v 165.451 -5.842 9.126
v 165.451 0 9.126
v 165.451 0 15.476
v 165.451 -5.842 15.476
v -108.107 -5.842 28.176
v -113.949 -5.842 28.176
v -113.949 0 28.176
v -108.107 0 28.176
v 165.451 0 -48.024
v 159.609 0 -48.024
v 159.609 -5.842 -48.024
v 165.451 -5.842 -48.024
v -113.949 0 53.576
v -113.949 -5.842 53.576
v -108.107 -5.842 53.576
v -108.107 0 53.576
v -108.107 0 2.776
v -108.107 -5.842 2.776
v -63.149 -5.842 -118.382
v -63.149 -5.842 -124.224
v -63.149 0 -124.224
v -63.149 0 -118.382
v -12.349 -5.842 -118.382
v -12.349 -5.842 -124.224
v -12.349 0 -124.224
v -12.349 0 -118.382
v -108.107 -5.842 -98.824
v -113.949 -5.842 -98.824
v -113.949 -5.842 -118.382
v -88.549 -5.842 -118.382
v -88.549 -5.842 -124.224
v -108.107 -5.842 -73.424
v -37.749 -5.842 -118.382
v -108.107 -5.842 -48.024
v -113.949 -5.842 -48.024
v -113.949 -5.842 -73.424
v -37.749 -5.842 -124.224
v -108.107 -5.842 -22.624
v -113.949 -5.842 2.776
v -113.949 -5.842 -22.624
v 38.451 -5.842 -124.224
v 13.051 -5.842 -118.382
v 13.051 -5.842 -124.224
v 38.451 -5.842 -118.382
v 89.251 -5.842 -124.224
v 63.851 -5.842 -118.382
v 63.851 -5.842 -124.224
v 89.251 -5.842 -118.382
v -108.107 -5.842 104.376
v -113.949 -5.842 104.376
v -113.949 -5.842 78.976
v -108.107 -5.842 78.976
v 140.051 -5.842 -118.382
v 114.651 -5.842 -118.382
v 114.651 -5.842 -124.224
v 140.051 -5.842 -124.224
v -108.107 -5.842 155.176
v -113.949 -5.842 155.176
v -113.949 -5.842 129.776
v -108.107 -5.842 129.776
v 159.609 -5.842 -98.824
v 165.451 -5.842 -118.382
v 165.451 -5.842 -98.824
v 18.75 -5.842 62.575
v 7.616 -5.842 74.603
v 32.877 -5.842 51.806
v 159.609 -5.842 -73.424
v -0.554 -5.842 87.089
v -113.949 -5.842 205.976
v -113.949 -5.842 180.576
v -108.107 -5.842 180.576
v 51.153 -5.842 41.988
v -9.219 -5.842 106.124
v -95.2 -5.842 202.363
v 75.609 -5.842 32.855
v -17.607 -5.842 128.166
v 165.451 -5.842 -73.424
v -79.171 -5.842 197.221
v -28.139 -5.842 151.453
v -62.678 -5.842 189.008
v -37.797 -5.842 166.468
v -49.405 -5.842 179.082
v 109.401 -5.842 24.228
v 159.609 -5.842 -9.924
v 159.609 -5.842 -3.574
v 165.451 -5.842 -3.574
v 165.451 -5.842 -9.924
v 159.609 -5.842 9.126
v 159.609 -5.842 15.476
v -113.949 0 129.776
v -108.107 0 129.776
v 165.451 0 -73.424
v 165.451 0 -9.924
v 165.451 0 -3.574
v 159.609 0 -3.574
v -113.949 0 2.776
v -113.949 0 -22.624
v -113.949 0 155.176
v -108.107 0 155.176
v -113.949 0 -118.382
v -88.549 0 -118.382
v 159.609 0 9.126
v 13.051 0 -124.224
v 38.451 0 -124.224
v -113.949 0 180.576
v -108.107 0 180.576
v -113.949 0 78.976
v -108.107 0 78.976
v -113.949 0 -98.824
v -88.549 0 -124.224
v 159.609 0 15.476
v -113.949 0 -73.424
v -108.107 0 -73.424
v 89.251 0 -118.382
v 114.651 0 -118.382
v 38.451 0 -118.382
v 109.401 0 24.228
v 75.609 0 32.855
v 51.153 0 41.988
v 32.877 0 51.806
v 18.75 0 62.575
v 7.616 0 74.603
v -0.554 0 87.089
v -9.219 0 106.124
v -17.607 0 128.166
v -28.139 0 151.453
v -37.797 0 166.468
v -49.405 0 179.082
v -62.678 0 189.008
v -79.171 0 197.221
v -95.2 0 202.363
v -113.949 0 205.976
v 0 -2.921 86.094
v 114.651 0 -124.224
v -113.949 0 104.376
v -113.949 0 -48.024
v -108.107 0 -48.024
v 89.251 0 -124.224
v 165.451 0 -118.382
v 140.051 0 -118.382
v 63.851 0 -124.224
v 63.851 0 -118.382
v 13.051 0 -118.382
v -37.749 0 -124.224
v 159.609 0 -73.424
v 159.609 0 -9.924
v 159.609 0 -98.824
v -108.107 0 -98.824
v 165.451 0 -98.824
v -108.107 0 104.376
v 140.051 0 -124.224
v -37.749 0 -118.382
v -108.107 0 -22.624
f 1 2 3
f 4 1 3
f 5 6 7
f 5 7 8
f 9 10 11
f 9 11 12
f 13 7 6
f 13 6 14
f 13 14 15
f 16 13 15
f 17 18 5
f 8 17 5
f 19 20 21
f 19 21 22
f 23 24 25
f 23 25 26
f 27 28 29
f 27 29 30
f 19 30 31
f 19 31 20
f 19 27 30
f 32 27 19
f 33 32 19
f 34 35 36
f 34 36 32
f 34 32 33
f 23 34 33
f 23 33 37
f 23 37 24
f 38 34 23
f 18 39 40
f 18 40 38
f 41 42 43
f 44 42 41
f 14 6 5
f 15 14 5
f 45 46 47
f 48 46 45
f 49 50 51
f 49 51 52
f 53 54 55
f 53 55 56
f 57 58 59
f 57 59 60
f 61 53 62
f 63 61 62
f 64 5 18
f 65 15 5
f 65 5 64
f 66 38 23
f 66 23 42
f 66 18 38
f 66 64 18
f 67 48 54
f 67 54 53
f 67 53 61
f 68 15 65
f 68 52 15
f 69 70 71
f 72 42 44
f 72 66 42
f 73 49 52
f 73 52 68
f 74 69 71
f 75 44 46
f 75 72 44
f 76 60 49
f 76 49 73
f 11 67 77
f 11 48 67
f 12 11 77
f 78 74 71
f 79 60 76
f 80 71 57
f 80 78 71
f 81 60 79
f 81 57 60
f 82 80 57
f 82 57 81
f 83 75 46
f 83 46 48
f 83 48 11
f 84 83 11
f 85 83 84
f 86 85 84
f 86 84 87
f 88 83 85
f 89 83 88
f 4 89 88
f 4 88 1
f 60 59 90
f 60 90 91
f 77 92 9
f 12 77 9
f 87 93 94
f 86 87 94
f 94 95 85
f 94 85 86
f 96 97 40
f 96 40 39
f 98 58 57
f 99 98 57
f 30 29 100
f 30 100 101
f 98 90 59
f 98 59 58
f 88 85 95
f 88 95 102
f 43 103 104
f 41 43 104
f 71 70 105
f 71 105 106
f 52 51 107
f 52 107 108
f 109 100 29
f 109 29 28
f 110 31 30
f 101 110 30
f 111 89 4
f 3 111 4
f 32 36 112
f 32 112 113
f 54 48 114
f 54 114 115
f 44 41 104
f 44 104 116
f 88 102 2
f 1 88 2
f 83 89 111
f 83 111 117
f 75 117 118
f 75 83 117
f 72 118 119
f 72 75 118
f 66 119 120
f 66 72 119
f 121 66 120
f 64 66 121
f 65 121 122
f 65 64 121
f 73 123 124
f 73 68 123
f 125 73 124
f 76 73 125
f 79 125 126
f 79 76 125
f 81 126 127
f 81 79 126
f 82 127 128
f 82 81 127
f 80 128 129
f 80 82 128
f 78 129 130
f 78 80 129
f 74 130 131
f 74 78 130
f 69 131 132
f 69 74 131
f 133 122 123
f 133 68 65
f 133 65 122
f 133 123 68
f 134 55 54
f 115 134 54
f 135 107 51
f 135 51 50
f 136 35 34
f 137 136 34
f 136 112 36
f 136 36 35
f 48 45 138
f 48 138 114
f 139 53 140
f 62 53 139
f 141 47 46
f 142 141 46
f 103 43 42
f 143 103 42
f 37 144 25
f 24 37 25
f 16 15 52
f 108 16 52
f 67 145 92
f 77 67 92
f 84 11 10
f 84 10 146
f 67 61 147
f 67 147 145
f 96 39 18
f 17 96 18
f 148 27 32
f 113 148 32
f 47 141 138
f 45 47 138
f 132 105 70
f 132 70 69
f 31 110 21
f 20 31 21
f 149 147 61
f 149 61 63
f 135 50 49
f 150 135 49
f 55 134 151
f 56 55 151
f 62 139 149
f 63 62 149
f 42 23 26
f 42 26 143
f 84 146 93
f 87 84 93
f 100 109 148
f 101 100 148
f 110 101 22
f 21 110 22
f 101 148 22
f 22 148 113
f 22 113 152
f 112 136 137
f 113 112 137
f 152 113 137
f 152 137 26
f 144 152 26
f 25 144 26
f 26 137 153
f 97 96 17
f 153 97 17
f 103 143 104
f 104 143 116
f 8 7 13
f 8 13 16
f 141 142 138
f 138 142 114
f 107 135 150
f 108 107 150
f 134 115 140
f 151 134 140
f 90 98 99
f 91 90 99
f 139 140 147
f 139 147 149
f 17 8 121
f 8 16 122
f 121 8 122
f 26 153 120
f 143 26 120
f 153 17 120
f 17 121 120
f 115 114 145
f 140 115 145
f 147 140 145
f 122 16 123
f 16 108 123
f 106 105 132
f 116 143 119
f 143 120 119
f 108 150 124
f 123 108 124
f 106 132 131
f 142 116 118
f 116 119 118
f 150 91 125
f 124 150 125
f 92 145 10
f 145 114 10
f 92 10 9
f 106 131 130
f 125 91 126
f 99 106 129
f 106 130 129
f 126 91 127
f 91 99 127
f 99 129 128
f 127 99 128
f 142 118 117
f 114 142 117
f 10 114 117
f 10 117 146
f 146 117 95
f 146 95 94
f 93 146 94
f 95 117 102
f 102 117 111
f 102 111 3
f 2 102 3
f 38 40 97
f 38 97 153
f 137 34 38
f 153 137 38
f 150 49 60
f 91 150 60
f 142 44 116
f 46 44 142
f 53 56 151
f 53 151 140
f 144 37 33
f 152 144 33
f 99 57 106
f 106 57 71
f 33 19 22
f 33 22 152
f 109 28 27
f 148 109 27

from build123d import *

# Parameters (mm, degrees)
F0_W     = 279.4
F0_H     = 330.2
F1_DEPTH = 5.842
F2_W     = 25.4
F2_H     = 5.842
F2_W_2   = 5.842
F2_H_2   = 25.4
F2_H_3   = 38.1
F3_DEPTH = 5.842
F5_DEPTH = 5.842
F6_W     = 5.842
F6_H     = 12.7
F7_DEPTH = 5.842
F8_R     = 3.175
F9_DEPTH = 5.842


with BuildPart() as f1:
    # F0 (on Front) → F1 (new body)
    with BuildSketch(Plane.XZ):
        with Locations((25.751306051, 40.8756073241)):
            Rectangle(F0_W, F0_H)
    extrude(amount=F1_DEPTH)

    # F2 (on face) → F3 (cut, through all)
    with BuildSketch(Plane.XZ.offset(5.842)):
        with Locations((152.751306051, -121.3033926759)):
            Rectangle(F2_W, F2_H)
        with Locations((101.951306051, -121.3033926759)):
            Rectangle(F2_W, F2_H)
        with Locations((51.151306051, -121.3033926759)):
            Rectangle(F2_W, F2_H)
        with Locations((0.351306051, -121.3033926759)):
            Rectangle(F2_W, F2_H)
        with Locations((-50.448693949, -121.3033926759)):
            Rectangle(F2_W, F2_H)
        with Locations((162.530306051, -86.1243926759)):
            Rectangle(F2_W_2, F2_H_2)
        with Locations((162.530306051, -28.9743926759)):
            Rectangle(F2_W_2, F2_H_3)
        with Locations((-111.027693949, -86.1243926759)):
            Rectangle(F2_W_2, F2_H_2)
        with Locations((-111.027693949, -35.3243926759)):
            Rectangle(F2_W_2, F2_H_2)
        with Locations((-111.027693949, 15.4756073241)):
            Rectangle(F2_W_2, F2_H_2)
        with Locations((-111.027693949, 66.2756073241)):
            Rectangle(F2_W_2, F2_H_2)
        with Locations((-111.027693949, 167.8756073241)):
            Rectangle(F2_W_2, F2_H_2)
        with Locations((-111.027693949, 117.0756073241)):
            Rectangle(F2_W_2, F2_H_2)
        with Locations((-101.248693949, -121.3033926759)):
            Rectangle(F2_W, F2_H)
    extrude(amount=-F3_DEPTH, mode=Mode.SUBTRACT)

    # F4 (on face) → F5 (cut, through all)
    with BuildSketch(Plane.XZ.offset(5.842)):
        with BuildLine():
            add(Edge.make_bspline(
                [(159.609306051, 15.4756073241), (73.376306051, 28.1756073241), (-24.4799113405, 59.233935121), (-21.873693949, 193.2756073241), (-113.948693949, 205.9756073241)],
                knots=[0, 0, 0, 0, 0.5067216409, 1, 1, 1, 1], degree=3))
            Line((159.609306051, 15.4756073241), (165.451306051, 15.4756073241))
            Line((165.451306051, 15.4756073241), (165.451306051, 205.9756073241))
            Line((165.451306051, 205.9756073241), (-113.948693949, 205.9756073241))
        make_face()
    extrude(amount=-F5_DEPTH, mode=Mode.SUBTRACT)

    # F6 (on face) → F7 (cut, through all)
    with BuildSketch(Plane.XZ.offset(5.842)):
        with Locations((162.530306051, 2.7756073241)):
            Rectangle(F6_W, F6_H)
    extrude(amount=-F7_DEPTH, mode=Mode.SUBTRACT)

    # F8 (on face) → F9 (cut, through all)
    with BuildSketch(Plane.XZ.offset(5.842)):
        with Locations((-37.748693949, 190.1641073241)):
            Circle(F8_R)
    extrude(amount=-F9_DEPTH, mode=Mode.SUBTRACT)


solid = f1.part
